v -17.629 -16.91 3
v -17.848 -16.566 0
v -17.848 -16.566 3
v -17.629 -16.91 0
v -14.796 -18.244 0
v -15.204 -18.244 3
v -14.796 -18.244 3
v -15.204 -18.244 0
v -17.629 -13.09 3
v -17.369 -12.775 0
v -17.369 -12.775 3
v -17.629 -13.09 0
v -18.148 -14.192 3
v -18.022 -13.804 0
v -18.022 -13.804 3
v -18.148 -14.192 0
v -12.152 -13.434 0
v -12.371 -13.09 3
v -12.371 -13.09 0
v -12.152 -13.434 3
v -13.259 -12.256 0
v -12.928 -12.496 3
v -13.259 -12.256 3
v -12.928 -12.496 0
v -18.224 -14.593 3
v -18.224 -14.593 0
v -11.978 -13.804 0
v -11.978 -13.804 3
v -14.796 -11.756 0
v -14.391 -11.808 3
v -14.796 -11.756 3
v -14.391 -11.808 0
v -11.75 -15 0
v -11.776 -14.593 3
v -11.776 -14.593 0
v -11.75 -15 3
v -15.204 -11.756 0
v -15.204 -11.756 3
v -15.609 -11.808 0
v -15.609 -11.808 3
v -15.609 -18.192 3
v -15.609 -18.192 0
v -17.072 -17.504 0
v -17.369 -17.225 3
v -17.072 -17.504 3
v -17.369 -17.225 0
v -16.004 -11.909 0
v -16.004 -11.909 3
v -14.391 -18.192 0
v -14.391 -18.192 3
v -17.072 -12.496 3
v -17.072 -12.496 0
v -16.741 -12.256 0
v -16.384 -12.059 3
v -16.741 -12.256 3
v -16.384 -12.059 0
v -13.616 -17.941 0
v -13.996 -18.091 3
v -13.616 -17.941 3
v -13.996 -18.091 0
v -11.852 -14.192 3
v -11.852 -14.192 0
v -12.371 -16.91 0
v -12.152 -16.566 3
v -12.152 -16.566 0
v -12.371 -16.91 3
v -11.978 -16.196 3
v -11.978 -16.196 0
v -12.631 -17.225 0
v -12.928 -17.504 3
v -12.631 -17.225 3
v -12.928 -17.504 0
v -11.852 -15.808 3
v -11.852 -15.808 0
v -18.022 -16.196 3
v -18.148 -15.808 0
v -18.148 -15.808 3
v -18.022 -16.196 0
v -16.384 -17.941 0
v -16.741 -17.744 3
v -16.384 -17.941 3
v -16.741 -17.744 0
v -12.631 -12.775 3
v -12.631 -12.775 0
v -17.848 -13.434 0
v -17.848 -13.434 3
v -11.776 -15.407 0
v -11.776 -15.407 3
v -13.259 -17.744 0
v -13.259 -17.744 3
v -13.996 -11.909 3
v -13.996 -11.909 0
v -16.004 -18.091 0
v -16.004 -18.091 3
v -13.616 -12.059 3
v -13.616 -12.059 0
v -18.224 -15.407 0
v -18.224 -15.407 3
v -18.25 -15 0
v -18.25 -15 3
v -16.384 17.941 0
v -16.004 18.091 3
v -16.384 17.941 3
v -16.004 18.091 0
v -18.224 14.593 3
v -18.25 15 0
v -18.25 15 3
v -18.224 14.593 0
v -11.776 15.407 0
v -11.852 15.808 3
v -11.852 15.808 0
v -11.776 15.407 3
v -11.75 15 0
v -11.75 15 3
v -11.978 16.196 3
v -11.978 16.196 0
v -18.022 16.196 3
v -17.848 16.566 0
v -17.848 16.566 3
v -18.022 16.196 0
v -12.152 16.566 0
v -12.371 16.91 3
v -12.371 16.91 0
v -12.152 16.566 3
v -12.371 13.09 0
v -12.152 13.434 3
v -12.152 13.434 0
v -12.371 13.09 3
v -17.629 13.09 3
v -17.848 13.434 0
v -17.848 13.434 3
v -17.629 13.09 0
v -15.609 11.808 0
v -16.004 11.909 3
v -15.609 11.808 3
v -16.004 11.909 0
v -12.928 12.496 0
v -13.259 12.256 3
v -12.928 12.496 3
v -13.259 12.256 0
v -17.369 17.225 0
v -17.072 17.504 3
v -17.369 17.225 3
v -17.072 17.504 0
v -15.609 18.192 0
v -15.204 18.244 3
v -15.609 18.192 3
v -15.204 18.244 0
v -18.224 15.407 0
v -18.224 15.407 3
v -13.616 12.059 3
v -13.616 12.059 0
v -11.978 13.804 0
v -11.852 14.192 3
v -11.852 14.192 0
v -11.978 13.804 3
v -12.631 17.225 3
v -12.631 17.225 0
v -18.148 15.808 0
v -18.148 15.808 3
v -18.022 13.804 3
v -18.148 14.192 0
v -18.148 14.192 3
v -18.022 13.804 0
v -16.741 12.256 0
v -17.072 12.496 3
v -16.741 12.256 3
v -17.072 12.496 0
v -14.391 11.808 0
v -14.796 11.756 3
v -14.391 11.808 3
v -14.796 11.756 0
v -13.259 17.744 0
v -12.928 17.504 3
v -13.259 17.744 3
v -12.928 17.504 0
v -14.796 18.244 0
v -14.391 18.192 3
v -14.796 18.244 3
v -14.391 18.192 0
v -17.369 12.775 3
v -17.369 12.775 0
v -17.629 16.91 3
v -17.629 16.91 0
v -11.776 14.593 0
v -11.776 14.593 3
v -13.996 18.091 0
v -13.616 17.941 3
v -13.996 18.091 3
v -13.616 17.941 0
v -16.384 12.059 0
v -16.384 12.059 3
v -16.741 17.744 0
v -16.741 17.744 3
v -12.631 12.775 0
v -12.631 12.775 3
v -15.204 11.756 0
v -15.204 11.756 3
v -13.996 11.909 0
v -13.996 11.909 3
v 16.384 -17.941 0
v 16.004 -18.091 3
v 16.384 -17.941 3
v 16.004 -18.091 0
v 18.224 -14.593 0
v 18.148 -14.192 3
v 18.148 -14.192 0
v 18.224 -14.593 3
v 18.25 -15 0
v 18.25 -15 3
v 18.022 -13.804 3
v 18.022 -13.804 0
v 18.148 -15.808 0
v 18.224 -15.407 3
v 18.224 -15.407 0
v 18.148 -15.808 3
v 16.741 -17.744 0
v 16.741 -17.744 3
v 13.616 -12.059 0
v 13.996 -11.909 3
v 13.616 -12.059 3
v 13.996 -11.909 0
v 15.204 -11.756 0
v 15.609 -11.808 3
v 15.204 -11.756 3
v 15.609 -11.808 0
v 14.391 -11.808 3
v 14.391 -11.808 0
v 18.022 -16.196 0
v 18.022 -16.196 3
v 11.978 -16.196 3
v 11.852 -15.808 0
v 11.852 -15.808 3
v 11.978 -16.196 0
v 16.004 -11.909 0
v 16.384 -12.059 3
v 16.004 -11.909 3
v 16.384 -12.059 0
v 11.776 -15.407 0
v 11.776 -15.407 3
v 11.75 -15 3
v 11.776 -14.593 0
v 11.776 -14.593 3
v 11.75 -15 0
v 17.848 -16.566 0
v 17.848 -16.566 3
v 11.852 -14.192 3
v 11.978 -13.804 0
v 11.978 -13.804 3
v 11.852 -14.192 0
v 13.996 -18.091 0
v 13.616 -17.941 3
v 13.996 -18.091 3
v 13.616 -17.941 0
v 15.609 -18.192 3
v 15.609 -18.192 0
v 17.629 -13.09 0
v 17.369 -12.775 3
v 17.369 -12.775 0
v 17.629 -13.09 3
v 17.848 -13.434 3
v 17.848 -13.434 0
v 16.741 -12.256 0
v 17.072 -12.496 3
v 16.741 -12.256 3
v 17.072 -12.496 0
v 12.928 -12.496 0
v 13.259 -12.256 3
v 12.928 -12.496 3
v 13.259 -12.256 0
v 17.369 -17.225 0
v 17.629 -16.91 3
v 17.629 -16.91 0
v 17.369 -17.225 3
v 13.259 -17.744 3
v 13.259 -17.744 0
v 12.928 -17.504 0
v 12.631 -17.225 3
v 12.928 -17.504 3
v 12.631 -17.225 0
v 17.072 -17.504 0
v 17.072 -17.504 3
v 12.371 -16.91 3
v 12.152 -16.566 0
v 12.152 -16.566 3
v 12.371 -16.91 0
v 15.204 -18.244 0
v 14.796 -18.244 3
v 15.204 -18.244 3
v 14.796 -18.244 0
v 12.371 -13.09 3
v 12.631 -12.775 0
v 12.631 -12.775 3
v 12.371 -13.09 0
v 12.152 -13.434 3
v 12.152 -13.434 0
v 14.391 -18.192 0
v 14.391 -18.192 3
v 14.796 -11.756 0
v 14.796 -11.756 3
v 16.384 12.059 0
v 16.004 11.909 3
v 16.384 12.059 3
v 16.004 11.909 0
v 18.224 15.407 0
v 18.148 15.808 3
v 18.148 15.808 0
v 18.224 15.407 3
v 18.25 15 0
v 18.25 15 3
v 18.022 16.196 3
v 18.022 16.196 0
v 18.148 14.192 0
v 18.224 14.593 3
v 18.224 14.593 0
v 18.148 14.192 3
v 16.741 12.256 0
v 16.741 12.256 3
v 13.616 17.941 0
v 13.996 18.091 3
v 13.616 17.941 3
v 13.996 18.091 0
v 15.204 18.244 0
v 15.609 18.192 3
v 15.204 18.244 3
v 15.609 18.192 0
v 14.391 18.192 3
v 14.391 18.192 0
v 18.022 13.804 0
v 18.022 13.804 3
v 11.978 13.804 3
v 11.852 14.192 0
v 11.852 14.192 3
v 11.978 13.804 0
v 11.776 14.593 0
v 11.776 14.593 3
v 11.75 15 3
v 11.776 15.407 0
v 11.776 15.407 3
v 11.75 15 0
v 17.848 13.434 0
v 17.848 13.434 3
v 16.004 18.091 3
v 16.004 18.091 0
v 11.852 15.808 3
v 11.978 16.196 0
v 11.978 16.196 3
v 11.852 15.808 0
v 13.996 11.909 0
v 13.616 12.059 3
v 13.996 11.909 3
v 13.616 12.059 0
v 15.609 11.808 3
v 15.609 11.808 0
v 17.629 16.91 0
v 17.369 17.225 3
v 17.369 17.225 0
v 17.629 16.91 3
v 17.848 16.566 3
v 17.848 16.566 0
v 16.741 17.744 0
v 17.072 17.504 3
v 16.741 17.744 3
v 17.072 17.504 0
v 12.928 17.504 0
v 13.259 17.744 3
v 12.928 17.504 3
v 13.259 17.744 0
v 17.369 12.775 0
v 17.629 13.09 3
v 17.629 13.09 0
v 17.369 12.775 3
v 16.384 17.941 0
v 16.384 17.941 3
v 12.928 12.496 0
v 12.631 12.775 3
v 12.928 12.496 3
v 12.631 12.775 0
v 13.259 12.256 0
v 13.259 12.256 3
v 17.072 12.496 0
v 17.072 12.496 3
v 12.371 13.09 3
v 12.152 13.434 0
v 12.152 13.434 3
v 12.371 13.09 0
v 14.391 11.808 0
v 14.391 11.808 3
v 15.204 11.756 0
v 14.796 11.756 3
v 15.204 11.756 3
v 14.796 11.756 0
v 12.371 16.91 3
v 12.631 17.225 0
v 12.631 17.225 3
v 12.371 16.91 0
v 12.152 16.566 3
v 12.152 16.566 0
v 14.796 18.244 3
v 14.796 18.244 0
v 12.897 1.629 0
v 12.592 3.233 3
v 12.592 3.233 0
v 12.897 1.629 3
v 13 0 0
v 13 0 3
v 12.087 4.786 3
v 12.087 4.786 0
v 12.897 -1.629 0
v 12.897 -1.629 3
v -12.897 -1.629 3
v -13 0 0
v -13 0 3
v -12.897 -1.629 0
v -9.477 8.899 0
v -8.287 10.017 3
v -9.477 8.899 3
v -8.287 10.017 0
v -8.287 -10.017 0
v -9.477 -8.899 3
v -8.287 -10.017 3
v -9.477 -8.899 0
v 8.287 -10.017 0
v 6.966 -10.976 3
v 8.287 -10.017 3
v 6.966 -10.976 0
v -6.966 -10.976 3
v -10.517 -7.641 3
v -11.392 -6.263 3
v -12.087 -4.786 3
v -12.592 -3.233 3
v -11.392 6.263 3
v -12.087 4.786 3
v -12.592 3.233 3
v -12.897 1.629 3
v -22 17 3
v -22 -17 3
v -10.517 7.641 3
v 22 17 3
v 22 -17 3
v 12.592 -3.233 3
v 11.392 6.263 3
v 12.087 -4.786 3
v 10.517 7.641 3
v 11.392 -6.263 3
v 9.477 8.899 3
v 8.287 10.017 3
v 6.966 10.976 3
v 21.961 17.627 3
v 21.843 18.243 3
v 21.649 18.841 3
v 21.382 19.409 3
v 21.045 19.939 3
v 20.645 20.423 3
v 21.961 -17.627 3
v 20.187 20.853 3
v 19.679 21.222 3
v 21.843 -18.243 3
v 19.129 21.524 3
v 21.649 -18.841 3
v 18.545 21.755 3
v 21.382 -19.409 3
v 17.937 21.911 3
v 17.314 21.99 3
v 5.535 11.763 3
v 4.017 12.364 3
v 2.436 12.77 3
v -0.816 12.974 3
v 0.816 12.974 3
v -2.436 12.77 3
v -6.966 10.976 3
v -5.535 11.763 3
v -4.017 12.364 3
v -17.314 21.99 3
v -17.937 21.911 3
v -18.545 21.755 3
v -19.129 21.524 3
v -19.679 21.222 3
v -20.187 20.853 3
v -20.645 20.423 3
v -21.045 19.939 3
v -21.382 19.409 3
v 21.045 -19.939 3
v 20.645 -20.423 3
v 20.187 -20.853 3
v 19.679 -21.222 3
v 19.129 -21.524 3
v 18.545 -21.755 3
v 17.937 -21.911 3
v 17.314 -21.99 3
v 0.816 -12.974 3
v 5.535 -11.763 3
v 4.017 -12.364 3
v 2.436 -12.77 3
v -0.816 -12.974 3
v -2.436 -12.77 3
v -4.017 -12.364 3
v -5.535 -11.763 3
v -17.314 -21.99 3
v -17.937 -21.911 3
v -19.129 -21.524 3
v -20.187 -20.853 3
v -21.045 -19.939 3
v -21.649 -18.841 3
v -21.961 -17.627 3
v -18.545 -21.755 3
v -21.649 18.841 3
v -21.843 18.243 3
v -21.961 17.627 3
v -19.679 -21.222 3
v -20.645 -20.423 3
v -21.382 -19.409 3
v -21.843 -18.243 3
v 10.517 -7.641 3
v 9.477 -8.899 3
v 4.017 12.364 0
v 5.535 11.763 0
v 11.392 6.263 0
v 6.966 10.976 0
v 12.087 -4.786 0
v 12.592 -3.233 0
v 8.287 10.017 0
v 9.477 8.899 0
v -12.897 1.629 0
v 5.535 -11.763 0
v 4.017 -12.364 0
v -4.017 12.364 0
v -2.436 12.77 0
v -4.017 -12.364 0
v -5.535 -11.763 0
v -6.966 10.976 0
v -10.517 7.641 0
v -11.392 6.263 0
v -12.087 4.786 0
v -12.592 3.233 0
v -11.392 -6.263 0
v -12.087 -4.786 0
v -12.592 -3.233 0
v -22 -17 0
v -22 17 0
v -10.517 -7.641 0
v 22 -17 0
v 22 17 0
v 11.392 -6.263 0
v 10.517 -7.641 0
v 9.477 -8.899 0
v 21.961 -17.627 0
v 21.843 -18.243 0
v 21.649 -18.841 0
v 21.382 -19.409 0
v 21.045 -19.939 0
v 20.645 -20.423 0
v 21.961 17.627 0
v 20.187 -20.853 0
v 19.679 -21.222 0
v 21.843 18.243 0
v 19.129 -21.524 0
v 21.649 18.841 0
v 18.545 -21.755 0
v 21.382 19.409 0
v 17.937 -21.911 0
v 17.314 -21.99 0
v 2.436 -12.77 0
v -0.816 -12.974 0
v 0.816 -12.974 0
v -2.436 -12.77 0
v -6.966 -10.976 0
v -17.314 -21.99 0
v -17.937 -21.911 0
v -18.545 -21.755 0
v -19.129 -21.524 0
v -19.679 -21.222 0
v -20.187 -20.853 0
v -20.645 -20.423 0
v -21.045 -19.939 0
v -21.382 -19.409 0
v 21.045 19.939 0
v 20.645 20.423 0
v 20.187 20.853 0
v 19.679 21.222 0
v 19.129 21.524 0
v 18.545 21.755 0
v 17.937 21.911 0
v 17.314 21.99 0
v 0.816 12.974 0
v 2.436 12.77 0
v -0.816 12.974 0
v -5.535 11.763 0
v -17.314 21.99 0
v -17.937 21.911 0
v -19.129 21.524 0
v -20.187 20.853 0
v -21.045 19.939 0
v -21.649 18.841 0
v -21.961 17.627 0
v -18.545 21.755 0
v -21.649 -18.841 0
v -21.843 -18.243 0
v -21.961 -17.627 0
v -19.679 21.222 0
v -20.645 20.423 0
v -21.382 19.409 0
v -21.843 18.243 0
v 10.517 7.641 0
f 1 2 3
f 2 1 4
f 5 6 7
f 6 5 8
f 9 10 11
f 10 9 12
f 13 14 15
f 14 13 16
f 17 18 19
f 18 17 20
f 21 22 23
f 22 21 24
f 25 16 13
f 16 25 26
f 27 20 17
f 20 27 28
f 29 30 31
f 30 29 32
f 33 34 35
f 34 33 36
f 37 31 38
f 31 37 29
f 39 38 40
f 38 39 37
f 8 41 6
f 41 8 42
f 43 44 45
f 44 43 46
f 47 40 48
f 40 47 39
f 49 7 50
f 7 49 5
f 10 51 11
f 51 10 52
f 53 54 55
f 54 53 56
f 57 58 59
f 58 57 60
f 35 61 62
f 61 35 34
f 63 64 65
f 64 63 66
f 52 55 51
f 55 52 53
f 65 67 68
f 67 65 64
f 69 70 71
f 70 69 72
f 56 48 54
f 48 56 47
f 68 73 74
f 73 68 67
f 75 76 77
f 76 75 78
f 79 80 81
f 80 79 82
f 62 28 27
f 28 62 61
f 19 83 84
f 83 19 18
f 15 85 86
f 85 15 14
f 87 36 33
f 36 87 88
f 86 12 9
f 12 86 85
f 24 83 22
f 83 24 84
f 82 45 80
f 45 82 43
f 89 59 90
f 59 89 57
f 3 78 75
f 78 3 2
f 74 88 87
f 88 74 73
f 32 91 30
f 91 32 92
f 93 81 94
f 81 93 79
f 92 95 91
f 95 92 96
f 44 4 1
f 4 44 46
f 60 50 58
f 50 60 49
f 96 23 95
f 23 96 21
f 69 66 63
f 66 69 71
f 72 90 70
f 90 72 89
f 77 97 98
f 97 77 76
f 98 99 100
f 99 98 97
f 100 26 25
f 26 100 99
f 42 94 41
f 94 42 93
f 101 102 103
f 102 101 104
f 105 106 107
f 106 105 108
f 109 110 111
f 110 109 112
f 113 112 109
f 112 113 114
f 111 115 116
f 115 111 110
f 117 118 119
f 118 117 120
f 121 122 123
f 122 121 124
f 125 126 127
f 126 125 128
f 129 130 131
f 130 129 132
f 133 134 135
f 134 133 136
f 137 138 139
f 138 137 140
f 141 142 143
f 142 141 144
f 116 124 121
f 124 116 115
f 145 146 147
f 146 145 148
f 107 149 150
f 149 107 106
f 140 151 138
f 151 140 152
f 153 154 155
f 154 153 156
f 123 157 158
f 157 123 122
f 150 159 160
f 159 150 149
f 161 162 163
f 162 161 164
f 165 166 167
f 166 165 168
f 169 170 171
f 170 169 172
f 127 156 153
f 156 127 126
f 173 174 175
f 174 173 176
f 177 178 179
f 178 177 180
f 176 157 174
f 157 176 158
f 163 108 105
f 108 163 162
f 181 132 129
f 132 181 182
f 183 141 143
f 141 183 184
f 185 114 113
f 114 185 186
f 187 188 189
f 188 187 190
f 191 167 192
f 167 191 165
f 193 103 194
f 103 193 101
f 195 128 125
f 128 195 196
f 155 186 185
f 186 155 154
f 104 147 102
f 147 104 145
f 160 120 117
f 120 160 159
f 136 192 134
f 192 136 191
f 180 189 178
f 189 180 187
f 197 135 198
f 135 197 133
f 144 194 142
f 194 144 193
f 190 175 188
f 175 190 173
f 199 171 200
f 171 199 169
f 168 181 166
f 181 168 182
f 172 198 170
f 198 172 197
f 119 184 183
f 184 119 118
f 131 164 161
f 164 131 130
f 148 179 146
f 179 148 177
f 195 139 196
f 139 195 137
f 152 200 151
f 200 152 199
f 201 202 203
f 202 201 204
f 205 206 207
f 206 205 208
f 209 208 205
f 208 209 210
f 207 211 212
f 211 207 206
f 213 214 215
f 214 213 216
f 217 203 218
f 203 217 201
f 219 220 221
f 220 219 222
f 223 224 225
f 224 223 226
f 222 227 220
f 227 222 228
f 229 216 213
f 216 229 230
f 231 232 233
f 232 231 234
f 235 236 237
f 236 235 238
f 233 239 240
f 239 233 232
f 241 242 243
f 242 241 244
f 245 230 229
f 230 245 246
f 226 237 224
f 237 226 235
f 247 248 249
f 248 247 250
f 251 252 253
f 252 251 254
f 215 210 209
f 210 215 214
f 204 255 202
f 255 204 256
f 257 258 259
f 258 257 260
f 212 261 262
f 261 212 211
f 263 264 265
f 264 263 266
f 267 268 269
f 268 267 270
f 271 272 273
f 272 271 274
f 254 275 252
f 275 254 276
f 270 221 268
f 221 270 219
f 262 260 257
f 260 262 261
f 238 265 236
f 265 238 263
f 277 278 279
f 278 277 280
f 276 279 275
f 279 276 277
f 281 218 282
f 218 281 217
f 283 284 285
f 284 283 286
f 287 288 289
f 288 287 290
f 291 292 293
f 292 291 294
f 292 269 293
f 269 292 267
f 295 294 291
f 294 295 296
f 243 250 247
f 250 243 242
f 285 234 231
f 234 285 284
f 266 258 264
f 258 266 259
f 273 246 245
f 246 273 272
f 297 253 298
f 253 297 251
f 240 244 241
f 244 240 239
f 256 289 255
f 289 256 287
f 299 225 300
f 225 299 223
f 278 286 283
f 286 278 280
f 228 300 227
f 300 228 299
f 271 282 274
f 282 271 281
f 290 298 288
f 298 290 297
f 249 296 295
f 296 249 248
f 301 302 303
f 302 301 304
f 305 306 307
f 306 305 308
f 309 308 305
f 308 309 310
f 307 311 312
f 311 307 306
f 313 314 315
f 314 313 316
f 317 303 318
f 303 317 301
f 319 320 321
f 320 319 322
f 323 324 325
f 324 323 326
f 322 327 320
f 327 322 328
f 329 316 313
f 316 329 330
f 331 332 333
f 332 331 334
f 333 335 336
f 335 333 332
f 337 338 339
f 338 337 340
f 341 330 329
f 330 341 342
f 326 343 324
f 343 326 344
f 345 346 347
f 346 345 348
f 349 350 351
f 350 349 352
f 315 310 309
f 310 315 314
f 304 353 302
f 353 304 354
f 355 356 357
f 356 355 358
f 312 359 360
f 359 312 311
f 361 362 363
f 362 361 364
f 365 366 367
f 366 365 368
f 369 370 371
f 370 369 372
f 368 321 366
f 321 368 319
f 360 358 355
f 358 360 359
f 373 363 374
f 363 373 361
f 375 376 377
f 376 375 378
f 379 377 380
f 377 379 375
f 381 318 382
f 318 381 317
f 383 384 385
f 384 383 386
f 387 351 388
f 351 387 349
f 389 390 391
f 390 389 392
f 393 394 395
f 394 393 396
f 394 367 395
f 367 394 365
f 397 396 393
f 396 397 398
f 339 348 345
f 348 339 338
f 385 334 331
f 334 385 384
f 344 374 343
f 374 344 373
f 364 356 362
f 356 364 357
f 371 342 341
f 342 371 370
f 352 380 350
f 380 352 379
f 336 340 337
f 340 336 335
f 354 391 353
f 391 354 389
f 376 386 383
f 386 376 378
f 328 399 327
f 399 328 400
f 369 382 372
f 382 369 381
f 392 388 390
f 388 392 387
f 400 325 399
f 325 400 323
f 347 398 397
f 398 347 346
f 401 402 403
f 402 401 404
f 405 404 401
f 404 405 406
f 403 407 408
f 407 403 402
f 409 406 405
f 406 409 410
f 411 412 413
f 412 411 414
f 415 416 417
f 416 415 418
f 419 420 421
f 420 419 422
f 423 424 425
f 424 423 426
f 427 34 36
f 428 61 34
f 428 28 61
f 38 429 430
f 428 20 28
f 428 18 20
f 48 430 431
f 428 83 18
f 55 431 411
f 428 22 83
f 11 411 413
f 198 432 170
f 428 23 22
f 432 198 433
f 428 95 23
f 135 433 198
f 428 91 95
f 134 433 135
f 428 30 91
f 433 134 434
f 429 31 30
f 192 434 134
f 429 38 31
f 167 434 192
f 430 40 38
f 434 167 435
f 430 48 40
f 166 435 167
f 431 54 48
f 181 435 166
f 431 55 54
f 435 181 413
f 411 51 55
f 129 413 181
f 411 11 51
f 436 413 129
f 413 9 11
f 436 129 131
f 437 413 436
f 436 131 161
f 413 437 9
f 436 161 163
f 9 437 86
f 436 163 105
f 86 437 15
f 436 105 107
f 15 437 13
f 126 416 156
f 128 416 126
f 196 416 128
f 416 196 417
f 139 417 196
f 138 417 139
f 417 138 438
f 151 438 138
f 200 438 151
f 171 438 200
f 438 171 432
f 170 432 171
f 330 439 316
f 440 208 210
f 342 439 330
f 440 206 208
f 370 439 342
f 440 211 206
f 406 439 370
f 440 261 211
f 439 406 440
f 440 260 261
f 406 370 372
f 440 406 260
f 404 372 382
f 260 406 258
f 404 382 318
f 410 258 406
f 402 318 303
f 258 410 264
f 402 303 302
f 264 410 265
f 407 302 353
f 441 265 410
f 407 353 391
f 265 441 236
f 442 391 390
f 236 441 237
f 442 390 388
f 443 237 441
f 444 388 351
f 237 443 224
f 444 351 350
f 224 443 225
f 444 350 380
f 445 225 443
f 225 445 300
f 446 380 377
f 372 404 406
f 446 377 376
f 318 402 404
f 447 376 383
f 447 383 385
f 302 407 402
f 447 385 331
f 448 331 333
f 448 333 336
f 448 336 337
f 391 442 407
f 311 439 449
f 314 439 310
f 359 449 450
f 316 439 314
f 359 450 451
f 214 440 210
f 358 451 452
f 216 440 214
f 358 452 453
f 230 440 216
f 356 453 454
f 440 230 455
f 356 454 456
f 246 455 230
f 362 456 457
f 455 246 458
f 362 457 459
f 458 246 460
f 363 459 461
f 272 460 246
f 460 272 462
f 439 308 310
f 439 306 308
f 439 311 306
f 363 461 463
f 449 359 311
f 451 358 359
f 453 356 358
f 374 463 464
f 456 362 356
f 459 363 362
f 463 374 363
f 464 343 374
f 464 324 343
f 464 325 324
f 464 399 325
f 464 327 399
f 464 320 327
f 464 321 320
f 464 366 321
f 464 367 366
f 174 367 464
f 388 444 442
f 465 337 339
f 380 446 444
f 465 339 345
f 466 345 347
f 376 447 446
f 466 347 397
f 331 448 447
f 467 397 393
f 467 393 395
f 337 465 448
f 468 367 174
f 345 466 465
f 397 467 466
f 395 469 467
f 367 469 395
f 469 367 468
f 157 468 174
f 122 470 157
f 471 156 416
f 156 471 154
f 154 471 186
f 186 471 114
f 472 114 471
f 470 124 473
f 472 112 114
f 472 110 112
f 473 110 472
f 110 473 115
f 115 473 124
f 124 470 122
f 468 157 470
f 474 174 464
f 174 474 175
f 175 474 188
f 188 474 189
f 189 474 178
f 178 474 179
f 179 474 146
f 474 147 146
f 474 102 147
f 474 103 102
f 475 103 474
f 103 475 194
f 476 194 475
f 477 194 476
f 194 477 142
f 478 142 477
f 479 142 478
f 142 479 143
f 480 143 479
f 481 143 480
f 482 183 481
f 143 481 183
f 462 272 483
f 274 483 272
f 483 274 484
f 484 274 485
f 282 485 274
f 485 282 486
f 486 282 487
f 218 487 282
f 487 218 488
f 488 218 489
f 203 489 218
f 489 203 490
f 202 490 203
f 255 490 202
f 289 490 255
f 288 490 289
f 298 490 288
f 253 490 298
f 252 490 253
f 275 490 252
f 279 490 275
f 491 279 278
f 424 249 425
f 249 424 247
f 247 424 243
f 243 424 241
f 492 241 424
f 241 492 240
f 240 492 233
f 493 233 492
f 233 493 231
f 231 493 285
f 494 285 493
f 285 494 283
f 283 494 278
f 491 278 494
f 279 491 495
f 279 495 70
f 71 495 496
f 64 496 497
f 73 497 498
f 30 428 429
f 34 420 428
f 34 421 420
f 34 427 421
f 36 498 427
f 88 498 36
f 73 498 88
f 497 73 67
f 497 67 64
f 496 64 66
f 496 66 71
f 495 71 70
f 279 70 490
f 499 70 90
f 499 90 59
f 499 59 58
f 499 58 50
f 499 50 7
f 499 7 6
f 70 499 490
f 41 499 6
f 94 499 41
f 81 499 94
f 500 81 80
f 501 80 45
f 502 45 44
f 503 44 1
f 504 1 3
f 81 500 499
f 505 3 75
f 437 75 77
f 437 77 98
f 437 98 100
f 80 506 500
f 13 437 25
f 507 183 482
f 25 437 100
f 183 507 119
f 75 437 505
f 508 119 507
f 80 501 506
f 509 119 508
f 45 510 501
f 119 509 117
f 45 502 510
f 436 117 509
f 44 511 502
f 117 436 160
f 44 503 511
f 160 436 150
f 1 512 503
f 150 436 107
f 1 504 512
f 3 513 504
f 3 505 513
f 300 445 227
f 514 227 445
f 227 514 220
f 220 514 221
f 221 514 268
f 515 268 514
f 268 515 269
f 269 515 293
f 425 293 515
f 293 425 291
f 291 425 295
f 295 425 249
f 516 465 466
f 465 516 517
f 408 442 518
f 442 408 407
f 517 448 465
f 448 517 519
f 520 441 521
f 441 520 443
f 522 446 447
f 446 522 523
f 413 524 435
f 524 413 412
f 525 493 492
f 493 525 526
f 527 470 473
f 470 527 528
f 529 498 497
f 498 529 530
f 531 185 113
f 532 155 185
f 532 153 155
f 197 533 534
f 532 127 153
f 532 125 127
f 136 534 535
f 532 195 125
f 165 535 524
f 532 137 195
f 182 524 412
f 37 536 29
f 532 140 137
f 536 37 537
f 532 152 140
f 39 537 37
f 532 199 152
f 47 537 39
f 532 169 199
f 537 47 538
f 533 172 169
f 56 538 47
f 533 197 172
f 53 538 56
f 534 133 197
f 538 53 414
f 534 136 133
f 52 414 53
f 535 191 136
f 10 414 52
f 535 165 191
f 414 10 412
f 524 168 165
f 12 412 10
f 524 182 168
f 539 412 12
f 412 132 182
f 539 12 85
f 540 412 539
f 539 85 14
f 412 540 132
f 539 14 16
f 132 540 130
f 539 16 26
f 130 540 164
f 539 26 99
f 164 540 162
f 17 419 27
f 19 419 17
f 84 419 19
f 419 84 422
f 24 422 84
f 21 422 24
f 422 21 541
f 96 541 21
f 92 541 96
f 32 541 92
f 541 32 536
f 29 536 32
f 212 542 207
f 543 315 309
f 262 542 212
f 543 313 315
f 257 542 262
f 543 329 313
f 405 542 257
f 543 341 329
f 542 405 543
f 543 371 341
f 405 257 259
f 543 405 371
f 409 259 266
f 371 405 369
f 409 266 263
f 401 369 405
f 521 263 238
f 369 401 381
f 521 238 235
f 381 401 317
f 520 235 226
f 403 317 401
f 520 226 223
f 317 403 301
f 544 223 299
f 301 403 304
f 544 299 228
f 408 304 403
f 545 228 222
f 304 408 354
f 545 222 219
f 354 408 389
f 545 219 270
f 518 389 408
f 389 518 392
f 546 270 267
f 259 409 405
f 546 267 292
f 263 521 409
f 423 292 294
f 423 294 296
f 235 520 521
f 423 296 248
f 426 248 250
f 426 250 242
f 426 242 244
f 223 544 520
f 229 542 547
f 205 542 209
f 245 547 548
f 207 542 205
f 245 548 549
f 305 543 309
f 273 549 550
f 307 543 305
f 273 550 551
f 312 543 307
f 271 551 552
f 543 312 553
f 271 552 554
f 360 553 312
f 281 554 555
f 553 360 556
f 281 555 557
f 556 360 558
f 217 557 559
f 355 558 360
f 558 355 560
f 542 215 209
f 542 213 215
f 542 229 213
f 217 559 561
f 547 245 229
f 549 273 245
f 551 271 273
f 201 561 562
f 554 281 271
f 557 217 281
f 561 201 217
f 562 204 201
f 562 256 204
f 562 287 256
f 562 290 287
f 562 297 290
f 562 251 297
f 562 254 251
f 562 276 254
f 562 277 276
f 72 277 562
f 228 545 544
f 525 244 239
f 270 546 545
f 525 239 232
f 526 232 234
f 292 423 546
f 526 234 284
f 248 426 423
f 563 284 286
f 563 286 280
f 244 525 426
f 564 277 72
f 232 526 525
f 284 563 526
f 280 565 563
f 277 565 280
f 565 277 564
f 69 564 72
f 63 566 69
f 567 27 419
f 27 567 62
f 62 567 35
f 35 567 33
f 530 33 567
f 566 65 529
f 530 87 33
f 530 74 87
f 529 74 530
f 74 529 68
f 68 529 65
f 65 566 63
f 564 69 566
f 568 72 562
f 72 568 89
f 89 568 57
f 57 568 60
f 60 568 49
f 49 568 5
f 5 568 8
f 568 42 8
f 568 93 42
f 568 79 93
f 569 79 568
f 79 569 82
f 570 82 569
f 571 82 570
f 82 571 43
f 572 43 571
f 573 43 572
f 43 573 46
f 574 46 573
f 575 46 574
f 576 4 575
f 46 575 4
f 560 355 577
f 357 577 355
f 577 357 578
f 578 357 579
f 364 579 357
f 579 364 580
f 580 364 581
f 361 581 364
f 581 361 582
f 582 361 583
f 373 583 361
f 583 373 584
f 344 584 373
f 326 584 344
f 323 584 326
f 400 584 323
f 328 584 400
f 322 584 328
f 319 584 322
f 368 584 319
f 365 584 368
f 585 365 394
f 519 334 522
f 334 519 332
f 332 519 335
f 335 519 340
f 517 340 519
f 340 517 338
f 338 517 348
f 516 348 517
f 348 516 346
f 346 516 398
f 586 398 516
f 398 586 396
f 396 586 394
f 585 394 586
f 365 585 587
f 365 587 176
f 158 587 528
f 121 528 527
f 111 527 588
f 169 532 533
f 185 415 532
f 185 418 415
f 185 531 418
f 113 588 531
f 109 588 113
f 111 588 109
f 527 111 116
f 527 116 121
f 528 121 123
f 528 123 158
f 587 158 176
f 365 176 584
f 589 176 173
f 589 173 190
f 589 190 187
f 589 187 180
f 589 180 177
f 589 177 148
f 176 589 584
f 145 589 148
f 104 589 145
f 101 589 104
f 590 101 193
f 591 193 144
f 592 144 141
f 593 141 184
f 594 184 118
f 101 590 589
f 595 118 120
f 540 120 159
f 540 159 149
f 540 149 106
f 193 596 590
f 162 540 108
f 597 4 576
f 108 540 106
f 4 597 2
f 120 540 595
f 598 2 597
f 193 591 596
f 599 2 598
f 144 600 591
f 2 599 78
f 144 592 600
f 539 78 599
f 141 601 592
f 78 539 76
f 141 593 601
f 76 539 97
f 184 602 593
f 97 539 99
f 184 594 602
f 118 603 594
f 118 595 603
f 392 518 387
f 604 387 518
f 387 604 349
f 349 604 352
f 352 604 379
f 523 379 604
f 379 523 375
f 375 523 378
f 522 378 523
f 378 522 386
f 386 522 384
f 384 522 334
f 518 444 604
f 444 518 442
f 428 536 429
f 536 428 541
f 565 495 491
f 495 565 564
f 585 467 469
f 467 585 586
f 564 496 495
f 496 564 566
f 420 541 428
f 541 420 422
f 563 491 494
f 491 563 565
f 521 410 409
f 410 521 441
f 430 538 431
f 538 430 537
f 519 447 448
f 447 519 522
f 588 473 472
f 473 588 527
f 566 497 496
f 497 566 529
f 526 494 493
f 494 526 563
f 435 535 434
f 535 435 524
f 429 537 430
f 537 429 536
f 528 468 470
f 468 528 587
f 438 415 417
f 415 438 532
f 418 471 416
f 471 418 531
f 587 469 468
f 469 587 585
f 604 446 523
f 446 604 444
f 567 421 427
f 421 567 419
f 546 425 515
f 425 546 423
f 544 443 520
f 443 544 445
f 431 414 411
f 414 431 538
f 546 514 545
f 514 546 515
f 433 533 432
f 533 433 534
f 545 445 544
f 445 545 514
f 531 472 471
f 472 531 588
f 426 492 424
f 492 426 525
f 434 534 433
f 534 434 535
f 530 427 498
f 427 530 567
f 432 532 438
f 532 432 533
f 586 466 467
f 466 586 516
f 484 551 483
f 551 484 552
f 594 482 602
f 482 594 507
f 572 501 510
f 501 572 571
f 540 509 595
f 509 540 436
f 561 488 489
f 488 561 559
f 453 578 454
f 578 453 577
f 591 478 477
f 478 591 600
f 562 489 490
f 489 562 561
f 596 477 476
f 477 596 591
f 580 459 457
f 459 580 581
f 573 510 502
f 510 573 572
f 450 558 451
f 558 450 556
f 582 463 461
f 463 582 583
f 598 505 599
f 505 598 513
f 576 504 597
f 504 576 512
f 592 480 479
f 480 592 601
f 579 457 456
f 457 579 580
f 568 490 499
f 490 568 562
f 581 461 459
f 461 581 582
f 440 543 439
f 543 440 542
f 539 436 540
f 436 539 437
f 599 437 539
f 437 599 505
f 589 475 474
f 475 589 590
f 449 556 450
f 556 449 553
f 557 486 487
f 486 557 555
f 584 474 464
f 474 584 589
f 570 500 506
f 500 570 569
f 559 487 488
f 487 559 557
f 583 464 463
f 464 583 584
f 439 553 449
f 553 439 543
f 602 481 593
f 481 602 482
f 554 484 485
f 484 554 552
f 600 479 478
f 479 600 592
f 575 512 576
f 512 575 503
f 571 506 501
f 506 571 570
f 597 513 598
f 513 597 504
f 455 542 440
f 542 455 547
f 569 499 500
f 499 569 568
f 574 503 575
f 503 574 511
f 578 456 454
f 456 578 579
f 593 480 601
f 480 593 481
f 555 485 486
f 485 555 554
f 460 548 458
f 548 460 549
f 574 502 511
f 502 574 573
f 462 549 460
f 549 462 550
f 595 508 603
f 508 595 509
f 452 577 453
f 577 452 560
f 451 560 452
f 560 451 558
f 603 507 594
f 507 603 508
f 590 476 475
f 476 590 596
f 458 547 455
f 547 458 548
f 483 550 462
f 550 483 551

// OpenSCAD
$fn = 50;


difference() {
	union() {
		hull() {
			translate(v = [-17.0000000000, 17.0000000000, 0]) {
				cylinder(h = 3, r = 5);
			}
			translate(v = [17.0000000000, 17.0000000000, 0]) {
				cylinder(h = 3, r = 5);
			}
			translate(v = [-17.0000000000, -17.0000000000, 0]) {
				cylinder(h = 3, r = 5);
			}
			translate(v = [17.0000000000, -17.0000000000, 0]) {
				cylinder(h = 3, r = 5);
			}
		}
	}
	union() {
		#translate(v = [-15.0000000000, -15.0000000000, -100.0000000000]) {
			cylinder(h = 200, r = 3.2500000000);
		}
		#translate(v = [-15.0000000000, 15.0000000000, -100.0000000000]) {
			cylinder(h = 200, r = 3.2500000000);
		}
		#translate(v = [15.0000000000, -15.0000000000, -100.0000000000]) {
			cylinder(h = 200, r = 3.2500000000);
		}
		#translate(v = [15.0000000000, 15.0000000000, -100.0000000000]) {
			cylinder(h = 200, r = 3.2500000000);
		}
		#cylinder(h = 3, r = 13.0000000000);
	}
}
